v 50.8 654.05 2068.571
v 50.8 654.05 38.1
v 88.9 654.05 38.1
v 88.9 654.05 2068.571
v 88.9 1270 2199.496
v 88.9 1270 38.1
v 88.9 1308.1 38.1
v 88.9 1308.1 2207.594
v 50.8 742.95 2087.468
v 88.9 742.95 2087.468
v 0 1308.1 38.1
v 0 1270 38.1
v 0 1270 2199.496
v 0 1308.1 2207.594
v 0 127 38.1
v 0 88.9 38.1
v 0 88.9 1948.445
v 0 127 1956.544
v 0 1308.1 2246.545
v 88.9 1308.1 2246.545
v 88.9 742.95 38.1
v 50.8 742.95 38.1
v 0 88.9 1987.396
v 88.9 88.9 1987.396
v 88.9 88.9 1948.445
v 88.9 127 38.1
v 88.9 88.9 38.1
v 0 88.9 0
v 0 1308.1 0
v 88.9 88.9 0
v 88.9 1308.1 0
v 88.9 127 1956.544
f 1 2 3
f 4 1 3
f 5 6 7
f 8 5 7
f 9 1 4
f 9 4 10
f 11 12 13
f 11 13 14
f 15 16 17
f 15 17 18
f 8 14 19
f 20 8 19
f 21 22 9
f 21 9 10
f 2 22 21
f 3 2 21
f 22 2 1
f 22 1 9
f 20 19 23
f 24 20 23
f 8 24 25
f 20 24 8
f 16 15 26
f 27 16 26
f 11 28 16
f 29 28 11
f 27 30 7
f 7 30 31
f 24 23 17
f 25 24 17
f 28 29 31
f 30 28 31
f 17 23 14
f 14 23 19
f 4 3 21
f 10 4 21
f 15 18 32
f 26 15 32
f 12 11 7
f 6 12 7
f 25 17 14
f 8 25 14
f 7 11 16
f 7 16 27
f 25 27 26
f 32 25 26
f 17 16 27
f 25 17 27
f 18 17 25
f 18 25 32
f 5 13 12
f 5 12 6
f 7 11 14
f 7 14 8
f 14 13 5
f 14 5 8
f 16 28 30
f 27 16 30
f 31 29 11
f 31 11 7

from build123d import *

# Parameters (mm, degrees)
F1_W     = 88.9
F1_H     = 1219.2
F2_DEPTH = 38.1
F3_W     = 88.9
F3_H     = 38.1
F3_W_2   = 38.1
F3_H_2   = 88.9
F4_DEPTH = 2540
F6_DEPTH = 88.901
F8_DEPTH = 88.9


with BuildPart() as f2:
    # F1 (on Top) → F2 (new body)
    with BuildSketch(Plane.XY):
        with Locations((44.45, 698.5)):
            Rectangle(F1_W, F1_H)
    extrude(amount=F2_DEPTH)


with BuildPart() as f4:
    # F3 (on face) → F4 (new body)
    with BuildSketch(Plane.XY.offset(38.1)):
        with Locations((44.45, 107.95)):
            Rectangle(F3_W, F3_H)
        with Locations((44.45, 1289.05)):
            Rectangle(F3_W, F3_H)
        with Locations((69.85, 698.5)):
            Rectangle(F3_W_2, F3_H_2)
    extrude(amount=F4_DEPTH)

    # F5 (on Right) → F6 (cut, through all)
    with BuildSketch(Plane.YZ):
        Polygon((1308.1, 2578.1), (88.9, 2578.1), (88.9, 1948.445102), (1308.1, 2207.594062), align=None)
    extrude(amount=F6_DEPTH, mode=Mode.SUBTRACT)


with BuildPart() as f8:
    # F7 (on Right) → F8 (new body)
    with BuildSketch(Plane.YZ):
        Polygon((88.9, 1987.396278), (88.9, 1948.445102), (1308.1, 2207.594062), (1308.1, 2246.545238), align=None)
    extrude(amount=F8_DEPTH)


solid = Compound([f2.part, f4.part, f8.part])
